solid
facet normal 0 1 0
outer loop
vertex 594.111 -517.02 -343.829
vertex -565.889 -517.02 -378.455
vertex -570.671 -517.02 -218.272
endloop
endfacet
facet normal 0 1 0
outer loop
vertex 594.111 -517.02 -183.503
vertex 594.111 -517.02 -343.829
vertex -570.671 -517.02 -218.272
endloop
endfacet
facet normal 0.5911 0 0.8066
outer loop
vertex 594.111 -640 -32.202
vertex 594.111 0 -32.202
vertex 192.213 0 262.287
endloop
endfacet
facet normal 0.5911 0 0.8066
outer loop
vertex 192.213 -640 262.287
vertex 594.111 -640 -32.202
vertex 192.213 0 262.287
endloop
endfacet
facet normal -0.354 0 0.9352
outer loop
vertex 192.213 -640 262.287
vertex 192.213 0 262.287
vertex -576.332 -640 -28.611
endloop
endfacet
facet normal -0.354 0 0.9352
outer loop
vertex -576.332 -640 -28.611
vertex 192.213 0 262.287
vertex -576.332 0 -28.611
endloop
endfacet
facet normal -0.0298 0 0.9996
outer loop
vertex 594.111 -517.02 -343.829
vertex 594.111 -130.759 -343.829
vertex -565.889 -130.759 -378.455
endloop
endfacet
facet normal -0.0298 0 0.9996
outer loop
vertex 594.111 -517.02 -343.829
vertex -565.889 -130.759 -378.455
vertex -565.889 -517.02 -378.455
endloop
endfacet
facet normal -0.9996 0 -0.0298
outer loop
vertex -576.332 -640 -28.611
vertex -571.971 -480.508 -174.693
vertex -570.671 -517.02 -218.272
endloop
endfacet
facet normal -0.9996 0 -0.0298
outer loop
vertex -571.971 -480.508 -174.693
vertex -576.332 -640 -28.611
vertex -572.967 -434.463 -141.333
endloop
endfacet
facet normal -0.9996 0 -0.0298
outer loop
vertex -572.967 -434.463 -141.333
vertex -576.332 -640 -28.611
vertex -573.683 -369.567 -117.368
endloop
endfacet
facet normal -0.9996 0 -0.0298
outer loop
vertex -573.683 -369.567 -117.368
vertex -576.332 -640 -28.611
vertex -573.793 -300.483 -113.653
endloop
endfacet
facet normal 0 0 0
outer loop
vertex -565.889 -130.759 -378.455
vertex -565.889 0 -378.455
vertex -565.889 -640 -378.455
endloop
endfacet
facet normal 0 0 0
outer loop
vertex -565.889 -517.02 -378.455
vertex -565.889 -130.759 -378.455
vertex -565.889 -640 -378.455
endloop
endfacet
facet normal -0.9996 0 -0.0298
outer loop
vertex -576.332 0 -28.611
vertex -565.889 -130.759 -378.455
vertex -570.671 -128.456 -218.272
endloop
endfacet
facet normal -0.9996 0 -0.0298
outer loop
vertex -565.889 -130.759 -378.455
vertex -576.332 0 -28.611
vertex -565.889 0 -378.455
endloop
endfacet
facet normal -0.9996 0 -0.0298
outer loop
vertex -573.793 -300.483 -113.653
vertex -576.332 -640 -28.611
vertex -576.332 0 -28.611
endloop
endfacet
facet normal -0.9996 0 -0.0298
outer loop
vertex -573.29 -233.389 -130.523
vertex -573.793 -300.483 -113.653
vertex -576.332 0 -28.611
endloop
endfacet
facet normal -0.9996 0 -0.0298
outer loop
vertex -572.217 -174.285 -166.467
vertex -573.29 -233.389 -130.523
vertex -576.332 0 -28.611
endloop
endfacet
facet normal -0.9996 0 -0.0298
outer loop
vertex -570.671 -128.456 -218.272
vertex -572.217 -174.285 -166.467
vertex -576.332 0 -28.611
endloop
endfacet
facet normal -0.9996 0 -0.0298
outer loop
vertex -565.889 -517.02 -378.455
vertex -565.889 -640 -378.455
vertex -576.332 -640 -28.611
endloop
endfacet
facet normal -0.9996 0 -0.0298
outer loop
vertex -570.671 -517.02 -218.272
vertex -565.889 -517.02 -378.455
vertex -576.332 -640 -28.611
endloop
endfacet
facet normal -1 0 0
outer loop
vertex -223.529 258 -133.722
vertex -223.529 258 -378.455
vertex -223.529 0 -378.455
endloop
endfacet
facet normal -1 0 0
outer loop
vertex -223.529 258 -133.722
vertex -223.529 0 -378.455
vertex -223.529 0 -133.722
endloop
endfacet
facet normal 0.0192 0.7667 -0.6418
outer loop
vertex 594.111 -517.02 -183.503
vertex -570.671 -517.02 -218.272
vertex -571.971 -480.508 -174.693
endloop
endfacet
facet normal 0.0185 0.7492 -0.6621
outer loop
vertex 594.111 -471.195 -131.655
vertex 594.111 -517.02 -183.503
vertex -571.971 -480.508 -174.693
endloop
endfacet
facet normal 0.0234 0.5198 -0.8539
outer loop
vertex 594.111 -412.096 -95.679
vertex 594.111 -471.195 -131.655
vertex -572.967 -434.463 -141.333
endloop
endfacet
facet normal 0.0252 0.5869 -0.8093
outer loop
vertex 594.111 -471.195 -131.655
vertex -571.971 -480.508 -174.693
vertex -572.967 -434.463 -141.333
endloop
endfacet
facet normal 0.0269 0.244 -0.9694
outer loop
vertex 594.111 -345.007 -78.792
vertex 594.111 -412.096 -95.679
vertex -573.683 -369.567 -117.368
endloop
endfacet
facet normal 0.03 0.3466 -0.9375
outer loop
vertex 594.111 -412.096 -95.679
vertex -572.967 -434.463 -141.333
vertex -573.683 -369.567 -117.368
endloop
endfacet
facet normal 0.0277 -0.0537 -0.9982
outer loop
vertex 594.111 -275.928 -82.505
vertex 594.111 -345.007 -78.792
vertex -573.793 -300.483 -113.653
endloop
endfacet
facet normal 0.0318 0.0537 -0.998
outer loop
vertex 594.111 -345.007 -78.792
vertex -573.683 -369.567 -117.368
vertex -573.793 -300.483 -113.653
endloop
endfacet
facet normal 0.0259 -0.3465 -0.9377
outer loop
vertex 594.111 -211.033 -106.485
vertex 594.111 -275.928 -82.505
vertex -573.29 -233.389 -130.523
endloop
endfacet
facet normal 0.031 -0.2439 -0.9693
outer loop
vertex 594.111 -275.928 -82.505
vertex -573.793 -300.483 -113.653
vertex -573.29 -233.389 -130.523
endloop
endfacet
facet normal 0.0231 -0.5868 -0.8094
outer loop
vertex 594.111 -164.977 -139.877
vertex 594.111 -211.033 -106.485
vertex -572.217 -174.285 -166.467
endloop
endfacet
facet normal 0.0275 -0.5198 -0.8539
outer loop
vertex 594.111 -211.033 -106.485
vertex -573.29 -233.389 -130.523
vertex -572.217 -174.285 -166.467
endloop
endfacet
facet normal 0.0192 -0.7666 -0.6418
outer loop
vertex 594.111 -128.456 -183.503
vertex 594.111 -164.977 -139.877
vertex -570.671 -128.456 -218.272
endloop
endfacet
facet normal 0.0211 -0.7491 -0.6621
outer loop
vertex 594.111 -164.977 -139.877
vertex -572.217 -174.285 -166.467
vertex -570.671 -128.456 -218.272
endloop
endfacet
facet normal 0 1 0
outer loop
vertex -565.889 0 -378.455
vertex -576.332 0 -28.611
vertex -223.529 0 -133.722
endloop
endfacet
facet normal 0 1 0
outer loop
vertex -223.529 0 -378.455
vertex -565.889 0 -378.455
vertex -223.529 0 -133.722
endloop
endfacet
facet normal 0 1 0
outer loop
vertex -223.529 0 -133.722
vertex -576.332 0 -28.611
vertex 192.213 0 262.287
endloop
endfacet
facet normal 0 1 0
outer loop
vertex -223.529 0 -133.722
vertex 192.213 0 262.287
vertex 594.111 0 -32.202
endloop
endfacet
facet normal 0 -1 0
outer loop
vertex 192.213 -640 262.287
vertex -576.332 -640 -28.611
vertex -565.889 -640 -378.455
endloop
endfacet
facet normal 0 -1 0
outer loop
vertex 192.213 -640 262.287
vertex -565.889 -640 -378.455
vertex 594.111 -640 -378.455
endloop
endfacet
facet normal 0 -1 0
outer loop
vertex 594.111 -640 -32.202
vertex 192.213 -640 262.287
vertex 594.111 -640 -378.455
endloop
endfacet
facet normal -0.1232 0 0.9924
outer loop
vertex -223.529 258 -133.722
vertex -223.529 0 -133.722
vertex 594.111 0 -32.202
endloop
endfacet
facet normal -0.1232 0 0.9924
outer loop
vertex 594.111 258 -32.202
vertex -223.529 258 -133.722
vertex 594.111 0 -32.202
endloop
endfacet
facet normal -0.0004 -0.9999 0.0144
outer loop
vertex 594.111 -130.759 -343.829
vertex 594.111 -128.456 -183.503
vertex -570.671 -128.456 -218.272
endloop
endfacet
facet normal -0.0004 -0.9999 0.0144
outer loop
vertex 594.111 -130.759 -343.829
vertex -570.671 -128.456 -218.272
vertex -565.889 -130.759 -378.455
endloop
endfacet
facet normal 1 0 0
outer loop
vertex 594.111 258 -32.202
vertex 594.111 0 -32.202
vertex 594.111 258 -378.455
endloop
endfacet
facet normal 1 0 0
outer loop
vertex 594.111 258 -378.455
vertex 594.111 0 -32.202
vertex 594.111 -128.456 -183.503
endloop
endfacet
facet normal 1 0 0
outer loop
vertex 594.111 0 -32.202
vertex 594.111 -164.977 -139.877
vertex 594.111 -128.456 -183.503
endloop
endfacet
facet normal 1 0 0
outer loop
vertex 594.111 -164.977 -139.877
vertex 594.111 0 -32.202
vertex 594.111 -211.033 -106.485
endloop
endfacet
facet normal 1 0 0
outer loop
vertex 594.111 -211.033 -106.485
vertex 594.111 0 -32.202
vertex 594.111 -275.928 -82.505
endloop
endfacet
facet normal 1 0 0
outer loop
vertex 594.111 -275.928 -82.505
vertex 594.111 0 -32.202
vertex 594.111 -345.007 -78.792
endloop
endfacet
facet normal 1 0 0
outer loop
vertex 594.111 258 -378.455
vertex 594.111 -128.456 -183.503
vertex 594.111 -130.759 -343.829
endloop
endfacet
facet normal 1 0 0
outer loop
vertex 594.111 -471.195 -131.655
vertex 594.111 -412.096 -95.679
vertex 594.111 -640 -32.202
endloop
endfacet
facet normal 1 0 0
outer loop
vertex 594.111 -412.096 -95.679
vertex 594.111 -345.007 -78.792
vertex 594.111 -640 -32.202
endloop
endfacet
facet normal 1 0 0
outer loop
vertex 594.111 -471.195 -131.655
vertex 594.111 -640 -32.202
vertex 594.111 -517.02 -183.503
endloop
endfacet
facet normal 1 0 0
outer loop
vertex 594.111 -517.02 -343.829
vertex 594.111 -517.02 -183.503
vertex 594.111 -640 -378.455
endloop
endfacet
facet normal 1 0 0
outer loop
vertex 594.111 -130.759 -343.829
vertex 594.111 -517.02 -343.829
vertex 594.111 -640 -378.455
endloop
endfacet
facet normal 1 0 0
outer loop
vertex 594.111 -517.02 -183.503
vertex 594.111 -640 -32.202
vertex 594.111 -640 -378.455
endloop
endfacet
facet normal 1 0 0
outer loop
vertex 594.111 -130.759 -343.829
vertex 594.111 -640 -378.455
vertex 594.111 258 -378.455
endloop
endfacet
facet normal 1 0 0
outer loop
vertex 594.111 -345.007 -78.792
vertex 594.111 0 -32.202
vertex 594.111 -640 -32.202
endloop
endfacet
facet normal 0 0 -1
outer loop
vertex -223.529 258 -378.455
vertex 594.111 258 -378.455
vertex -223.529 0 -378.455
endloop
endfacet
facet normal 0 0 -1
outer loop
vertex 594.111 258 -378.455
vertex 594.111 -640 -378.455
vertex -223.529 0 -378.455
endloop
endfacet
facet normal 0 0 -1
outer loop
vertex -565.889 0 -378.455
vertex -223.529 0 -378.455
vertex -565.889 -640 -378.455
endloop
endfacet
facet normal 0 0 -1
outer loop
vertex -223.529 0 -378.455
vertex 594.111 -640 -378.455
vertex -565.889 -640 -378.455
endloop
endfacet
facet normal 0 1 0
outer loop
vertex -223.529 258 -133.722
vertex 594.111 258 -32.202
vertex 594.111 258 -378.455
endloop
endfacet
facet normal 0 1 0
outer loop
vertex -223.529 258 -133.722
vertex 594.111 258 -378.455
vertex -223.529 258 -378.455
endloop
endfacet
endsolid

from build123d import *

# Parameters (mm, degrees)
F1_DEPTH = 640
F3_DEPTH = 258
F5_DEPTH = 1440


with BuildPart() as f1:
    # F0 (on Front) → F1 (new body)
    with BuildSketch(Plane.XZ):
        Polygon((-576.332047, -28.611164), (-565.888931, -378.455331), (594.111069, -378.455331), (594.111069, -32.202492), (192.212863, 262.286696), align=None)
    extrude(amount=F1_DEPTH)

    # F2 (on face) → F3 (join)
    with BuildSketch(Plane(origin=(0, 0, 0), x_dir=(-1, 0, 0), z_dir=(0, 1, 0))):
        Polygon((223.529473, -133.722216), (-594.111069, -32.202492), (-594.111069, -378.455331), (223.529473, -378.455331), align=None)
    extrude(amount=F3_DEPTH)

    # F4 (on face) → F5 (cut)
    with BuildSketch(Plane(origin=(-576.672258, 0, -17.214108), x_dir=(0, -1, 0), z_dir=(-0.999555, 0, -0.029837))):
        with BuildLine():
            Line((128.456429, -201.147199), (130.758941, -361.402132))
            Line((130.758941, -361.402132), (517.019868, -361.402132))
            Line((517.019868, -361.402132), (517.019868, -201.147199))
            ThreePointArc((517.019868, -201.147199), (322.738148, -95.409288), (128.456429, -201.147199))
        make_face()
    extrude(amount=-F5_DEPTH, mode=Mode.SUBTRACT)


solid = f1.part
